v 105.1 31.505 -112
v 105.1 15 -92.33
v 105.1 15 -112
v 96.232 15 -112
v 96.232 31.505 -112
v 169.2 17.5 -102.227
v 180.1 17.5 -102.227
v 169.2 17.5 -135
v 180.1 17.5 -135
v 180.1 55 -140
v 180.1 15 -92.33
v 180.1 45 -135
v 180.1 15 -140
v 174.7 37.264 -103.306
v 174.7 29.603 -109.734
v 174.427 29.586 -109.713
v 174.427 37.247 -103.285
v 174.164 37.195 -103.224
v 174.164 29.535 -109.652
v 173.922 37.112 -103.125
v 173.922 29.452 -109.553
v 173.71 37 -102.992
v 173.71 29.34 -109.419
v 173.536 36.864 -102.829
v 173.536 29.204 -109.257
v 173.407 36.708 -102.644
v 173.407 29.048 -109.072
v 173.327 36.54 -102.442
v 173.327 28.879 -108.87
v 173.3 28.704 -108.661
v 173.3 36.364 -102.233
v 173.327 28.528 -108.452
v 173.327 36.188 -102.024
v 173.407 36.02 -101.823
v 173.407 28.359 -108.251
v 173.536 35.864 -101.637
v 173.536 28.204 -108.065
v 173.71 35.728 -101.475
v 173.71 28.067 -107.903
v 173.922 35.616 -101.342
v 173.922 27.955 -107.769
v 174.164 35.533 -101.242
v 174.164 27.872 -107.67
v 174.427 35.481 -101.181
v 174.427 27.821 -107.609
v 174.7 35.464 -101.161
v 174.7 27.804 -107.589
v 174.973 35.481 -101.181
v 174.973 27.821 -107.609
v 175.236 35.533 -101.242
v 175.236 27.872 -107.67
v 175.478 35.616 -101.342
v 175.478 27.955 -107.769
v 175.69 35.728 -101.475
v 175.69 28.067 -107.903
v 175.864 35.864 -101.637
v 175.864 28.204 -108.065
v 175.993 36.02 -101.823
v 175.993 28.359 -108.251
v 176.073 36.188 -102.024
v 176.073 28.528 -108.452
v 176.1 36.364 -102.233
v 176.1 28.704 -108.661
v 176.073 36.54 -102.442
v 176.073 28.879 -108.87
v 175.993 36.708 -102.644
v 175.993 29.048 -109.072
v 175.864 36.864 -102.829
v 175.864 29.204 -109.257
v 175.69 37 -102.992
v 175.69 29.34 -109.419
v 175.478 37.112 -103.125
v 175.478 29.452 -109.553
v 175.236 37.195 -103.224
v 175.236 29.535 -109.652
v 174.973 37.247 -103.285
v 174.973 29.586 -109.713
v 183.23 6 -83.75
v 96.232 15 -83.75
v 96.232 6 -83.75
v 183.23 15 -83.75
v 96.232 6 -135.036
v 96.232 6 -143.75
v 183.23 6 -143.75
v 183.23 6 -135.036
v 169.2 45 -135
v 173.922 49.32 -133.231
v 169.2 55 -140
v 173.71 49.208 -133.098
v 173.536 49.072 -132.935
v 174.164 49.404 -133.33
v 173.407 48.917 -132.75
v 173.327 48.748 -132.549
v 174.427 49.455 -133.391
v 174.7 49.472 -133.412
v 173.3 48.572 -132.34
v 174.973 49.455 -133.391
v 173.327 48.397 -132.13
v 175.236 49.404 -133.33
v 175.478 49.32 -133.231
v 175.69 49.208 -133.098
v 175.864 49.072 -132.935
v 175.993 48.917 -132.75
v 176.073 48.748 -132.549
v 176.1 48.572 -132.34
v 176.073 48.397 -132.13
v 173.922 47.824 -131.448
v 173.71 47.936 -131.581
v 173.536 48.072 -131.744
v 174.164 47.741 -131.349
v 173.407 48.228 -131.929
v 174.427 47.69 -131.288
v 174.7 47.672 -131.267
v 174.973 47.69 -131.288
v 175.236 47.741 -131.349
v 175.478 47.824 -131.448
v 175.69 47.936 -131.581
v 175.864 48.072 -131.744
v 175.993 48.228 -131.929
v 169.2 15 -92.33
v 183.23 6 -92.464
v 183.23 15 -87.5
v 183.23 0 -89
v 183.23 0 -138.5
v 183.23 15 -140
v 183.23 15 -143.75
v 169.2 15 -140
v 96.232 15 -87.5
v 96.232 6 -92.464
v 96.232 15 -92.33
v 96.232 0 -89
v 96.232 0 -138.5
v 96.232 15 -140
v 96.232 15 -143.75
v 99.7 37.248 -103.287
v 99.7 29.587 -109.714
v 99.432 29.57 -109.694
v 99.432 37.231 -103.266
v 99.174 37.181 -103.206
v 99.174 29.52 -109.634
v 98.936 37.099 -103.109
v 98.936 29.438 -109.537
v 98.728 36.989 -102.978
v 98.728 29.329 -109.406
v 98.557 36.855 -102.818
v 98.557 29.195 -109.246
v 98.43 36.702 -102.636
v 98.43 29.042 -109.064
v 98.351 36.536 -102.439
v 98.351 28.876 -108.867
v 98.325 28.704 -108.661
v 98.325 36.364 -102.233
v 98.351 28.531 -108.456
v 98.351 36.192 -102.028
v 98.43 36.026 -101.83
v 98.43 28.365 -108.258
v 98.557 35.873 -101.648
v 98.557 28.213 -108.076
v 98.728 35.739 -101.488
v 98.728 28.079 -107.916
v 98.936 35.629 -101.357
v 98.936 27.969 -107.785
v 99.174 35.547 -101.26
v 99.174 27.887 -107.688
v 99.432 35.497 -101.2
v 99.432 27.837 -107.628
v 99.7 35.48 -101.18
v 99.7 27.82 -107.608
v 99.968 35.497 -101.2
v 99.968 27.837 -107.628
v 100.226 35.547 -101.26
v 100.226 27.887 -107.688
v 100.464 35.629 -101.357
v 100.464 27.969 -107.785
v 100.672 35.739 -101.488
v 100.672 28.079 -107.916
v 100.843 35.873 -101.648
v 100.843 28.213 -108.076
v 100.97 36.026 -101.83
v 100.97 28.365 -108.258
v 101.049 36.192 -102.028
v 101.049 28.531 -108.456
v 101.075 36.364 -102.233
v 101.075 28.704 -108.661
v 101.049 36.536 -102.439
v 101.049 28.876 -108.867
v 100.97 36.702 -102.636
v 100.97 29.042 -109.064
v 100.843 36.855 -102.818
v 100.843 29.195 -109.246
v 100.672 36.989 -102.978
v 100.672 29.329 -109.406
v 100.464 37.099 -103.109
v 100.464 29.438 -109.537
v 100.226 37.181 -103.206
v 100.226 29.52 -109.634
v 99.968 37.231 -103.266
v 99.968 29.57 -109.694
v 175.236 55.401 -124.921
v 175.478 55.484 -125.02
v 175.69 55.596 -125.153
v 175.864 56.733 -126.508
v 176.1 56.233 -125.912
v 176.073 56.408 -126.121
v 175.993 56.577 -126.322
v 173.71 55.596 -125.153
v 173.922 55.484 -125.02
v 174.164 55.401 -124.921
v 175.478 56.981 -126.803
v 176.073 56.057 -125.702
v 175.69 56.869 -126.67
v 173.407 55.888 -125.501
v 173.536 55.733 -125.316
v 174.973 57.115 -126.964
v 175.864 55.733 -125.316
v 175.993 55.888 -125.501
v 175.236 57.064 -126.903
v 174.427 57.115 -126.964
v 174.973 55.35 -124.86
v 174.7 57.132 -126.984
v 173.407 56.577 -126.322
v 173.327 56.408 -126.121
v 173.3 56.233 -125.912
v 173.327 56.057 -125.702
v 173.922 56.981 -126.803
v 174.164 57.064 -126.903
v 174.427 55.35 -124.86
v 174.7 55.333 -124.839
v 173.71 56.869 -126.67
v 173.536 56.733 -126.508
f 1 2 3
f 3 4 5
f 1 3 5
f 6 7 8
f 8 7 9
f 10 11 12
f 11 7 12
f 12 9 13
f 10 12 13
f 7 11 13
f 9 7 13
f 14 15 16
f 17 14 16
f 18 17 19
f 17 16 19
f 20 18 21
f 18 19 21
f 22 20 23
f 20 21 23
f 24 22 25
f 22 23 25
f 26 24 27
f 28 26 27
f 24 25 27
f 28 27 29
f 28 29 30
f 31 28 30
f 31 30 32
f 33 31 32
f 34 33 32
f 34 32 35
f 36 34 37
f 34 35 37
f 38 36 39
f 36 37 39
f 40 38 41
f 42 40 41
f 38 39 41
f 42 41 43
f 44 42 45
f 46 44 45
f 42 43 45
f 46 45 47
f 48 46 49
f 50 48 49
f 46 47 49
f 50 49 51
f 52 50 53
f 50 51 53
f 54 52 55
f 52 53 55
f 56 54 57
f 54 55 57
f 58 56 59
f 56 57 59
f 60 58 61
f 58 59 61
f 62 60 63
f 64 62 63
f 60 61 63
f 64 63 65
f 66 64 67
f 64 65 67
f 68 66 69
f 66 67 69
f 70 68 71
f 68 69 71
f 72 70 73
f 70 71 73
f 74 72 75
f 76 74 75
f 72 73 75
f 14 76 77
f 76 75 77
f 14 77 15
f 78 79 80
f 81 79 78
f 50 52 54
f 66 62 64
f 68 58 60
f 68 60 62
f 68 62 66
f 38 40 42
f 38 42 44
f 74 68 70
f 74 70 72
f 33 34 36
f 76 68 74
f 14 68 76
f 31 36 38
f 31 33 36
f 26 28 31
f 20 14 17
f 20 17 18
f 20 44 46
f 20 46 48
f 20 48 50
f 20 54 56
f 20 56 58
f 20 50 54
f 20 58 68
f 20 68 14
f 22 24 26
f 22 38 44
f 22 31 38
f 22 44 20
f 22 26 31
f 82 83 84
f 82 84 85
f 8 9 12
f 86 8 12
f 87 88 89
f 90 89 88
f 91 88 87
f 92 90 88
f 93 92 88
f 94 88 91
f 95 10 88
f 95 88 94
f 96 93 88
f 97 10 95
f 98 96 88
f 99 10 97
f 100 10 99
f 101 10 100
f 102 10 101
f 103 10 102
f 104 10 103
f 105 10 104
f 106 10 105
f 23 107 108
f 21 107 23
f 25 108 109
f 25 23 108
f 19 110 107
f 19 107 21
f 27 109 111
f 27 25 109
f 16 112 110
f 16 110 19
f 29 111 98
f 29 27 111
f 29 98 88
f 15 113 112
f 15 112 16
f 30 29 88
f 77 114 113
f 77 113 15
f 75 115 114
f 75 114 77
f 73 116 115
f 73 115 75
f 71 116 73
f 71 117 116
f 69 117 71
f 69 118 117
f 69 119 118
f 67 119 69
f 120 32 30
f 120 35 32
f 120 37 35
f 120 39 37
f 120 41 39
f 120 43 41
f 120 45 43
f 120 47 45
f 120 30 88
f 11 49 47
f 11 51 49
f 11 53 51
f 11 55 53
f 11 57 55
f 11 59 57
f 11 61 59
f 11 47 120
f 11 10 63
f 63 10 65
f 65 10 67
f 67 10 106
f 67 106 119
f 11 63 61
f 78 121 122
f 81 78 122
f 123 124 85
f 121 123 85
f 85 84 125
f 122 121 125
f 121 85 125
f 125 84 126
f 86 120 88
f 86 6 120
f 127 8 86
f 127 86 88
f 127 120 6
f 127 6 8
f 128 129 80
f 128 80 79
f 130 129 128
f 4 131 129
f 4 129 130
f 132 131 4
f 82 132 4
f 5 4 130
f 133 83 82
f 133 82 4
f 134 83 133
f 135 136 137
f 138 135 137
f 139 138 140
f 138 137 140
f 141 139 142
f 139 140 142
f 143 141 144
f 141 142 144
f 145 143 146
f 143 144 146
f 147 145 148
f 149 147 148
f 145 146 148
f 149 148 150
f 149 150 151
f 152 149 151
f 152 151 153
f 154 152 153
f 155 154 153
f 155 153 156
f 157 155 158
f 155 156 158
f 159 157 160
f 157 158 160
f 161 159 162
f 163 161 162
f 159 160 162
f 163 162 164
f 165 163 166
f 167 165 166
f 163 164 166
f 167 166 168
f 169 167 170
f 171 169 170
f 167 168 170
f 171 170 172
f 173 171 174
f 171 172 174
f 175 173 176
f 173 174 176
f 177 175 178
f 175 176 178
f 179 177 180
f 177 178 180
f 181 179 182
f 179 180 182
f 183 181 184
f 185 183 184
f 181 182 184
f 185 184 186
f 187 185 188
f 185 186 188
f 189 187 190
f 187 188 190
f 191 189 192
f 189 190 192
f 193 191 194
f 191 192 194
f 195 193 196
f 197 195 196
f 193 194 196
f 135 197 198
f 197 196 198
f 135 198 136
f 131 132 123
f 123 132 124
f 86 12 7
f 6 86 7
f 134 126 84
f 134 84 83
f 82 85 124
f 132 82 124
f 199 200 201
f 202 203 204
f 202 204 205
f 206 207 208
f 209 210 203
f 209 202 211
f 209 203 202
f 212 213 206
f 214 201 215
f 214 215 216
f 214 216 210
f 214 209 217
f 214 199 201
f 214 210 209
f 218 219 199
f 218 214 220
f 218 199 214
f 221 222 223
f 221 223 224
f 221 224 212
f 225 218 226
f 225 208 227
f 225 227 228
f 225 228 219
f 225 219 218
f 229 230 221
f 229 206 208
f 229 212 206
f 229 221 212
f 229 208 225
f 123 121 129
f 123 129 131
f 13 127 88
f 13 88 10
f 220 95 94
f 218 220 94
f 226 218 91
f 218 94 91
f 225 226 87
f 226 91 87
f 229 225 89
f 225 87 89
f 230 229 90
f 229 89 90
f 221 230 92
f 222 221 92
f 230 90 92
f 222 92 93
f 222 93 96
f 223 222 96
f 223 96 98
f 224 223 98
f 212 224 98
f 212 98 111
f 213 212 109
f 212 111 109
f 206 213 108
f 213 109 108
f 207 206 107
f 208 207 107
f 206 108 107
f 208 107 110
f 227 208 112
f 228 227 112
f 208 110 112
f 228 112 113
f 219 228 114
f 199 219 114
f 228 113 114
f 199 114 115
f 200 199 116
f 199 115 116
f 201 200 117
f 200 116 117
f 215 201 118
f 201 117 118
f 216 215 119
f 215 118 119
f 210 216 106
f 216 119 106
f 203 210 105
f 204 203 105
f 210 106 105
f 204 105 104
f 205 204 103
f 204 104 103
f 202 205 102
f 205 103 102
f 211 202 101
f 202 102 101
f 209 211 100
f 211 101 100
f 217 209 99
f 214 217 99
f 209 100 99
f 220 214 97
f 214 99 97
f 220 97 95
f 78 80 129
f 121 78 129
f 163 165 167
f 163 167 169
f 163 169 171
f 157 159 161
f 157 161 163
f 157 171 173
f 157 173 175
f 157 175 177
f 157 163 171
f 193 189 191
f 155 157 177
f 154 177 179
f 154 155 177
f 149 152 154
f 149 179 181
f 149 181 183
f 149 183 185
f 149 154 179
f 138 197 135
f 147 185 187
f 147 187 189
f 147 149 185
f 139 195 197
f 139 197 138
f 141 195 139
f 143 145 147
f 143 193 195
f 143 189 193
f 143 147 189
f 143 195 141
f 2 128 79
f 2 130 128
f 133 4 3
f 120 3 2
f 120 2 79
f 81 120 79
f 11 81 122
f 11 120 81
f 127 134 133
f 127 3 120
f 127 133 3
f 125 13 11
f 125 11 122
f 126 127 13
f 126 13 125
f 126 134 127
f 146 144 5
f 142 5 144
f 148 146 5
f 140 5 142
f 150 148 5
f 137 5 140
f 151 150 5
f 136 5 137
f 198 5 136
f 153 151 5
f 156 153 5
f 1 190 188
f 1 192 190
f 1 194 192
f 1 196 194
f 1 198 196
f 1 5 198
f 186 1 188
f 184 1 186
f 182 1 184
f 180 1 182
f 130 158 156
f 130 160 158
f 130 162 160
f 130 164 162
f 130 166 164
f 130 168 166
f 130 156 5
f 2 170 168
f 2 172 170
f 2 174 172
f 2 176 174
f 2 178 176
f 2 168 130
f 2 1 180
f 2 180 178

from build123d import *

# Parameters (mm, degrees)
SKETCH1_W              = 196
SKETCH1_H              = 150
BOSS_EXTRUDE1_DEPTH    = 15
SKETCH2_W              = 166
SKETCH2_H              = 55
CUT_EXTRUDE1_DEPTH     = 9.68
SKETCH3_R              = 1.5
BOSS_EXTRUDE2_DEPTH    = 10
SKETCH4_W              = 10.9
SKETCH4_H              = 64
BOSS_EXTRUDE3_DEPTH    = 40
CUT_EXTRUDE2_DEPTH     = 109
SKETCH6_R              = 1.4
SKETCH6_R_2            = 1.375
BOSS_EXTRUDE4_DEPTH    = 10
FILLET1_R              = 10
CUT_EXTRUDE4_START     = -15
CUT_EXTRUDE4_OUTLINE_R = 1.5
CUT_EXTRUDE4_DEPTH     = 15
SKETCH10_W             = 60
SKETCH10_H             = 37
CUT_EXTRUDE5_DEPTH     = 83
SKETCH11_W             = 10
SKETCH11_H             = 52.5
CUT_EXTRUDE6_DEPTH     = 36
SKETCH13_W             = 28
SKETCH13_H             = 42.5
CUT_EXTRUDE7_DEPTH     = 19
SKETCH19_W             = 4
SKETCH19_H             = 55
SKETCH19_W_2           = 2.77
SKETCH19_H_2           = 50
CUT_EXTRUDE9_DEPTH     = 76
SKETCH21_W             = 86.997648927
SKETCH21_H             = 15
BOSS_EXTRUDE6_DEPTH    = 3.75
SKETCH22_W             = 86.997648927
SKETCH22_H             = 15
BOSS_EXTRUDE7_DEPTH    = 3.75
CUT_EXTRUDE11_DEPTH    = 94.75
CUT_EXTRUDE12_DEPTH    = 16


# Read off the part's stored shape, not the designer's step: Cut-Extrude4
with BuildPart() as part:
    # Sketch1 → Boss-Extrude1 (new body)
    with BuildSketch(Plane(origin=(0, 0, 0), x_dir=(1, 0, 0), z_dir=(0, 1, 0))):
        with Locations((98, 75)):
            Rectangle(SKETCH1_W, SKETCH1_H)
    extrude(amount=BOSS_EXTRUDE1_DEPTH)

    # Sketch2 → Cut-Extrude1 (cut)
    with BuildSketch(Plane(origin=(0, 15, 0), x_dir=(1, 0, 0), z_dir=(0, 1, 0))):
        with Locations((98, 42.5)):
            Rectangle(SKETCH2_W, SKETCH2_H)
    extrude(amount=-CUT_EXTRUDE1_DEPTH, mode=Mode.SUBTRACT)

    # Sketch3 → Boss-Extrude2 (add)
    with BuildSketch(Plane(origin=(0, 15, 0), x_dir=(1, 0, 0), z_dir=(0, 1, 0))):
        with Locations(Location((25, 133.2, 0), (0, 0, 90))):
            Circle(SKETCH3_R)
        with Locations(Location((23.7, 85, 0), (0, 0, 90))):
            Circle(SKETCH3_R)
        with Locations(Location((75.8, 118, 0), (0, 0, 90))):
            Circle(SKETCH3_R)
        with Locations(Location((75.8, 90.1, 0), (0, 0, 90))):
            Circle(SKETCH3_R)
    extrude(amount=BOSS_EXTRUDE2_DEPTH)

    # Sketch4 → Boss-Extrude3 (add)
    with BuildSketch(Plane(origin=(0, 15, 0), x_dir=(1, 0, 0), z_dir=(0, 1, 0))):
        with Locations((99.65, 108)):
            Rectangle(SKETCH4_W, SKETCH4_H)
        with Locations((174.65, 108)):
            Rectangle(SKETCH4_W, SKETCH4_H)
    extrude(amount=BOSS_EXTRUDE3_DEPTH)

    # Sketch5 → Cut-Extrude2 (cut)
    with BuildSketch(Plane(origin=(196, 0, 0), x_dir=(0, 0, -1), z_dir=(1, 0, 0))):
        Polygon((140, 55), (92.329856296, 15), (75, 15), (75, 55), align=None)
    extrude(amount=-CUT_EXTRUDE2_DEPTH, mode=Mode.SUBTRACT)

    # Sketch6 → Boss-Extrude4 (add)
    with BuildSketch(Plane(origin=(0, -36.661217825, -30.762414355), x_dir=(1, 0, 0), z_dir=(0, 0.7660444431189771, 0.6427876096865404))):
        with Locations(Location((174.7, 132.599540569, 0), (0, 0, 90))):
            Circle(SKETCH6_R)
        with Locations(Location((174.7, 101.689540569, 0), (0, 0, 90))):
            Circle(SKETCH6_R)
        with Locations(Location((99.7, 132.599540569, 0), (0, 0, 90))):
            Circle(SKETCH6_R_2)
        with Locations(Location((99.7, 101.689540569, 0), (0, 0, 90))):
            Circle(SKETCH6_R_2)
    extrude(amount=BOSS_EXTRUDE4_DEPTH)

    # Fillet1
    fillet1_edges = [part.edges().sort_by_distance(p)[0] for p in [
        (196, 15, -75),
        (98, 15, -150),
        (0, 15, -75),
        (98, 15, 0),
    ]]
    fillet(fillet1_edges, radius=FILLET1_R - 0.0001)  # a hair under: the kernel refuses the full size

    # Cut-Extrude4 outline → Cut-Extrude4 (cut)
    with BuildSketch(Plane(origin=(0, 15, 0), x_dir=(1, 0, 0), z_dir=(0, 1, 0)).offset(CUT_EXTRUDE4_START)):
        Polygon((92.232351073, 87.5), (92.232351073, 140), (196, 140), (196, 150), (0, 150), (0, 0), (196, 0), (196, 87.5), align=None)
        with Locations((23.7, 85)):
            Circle(CUT_EXTRUDE4_OUTLINE_R, mode=Mode.SUBTRACT)
        with Locations((75.8, 90.1)):
            Circle(CUT_EXTRUDE4_OUTLINE_R, mode=Mode.SUBTRACT)
        with Locations((25, 133.2)):
            Circle(CUT_EXTRUDE4_OUTLINE_R, mode=Mode.SUBTRACT)
        with Locations((75.8, 118)):
            Circle(CUT_EXTRUDE4_OUTLINE_R, mode=Mode.SUBTRACT)
    extrude(amount=CUT_EXTRUDE4_DEPTH, mode=Mode.SUBTRACT)

    # Sketch10 → Cut-Extrude5 (cut)
    with BuildSketch(Plane.ZY.offset(-92.232351073)):
        with Locations((-110, 18.5)):
            Rectangle(SKETCH10_W, SKETCH10_H)
    extrude(amount=CUT_EXTRUDE5_DEPTH, mode=Mode.SUBTRACT)

    # Sketch11 → Cut-Extrude6 (cut)
    with BuildSketch(Plane(origin=(0, 15, 0), x_dir=(1, 0, 0), z_dir=(0, 1, 0))):
        with Locations((191, 113.75)):
            Rectangle(SKETCH11_W, SKETCH11_H)
    extrude(amount=-CUT_EXTRUDE6_DEPTH, mode=Mode.SUBTRACT)

    # Sketch13 → Cut-Extrude7 (cut)
    with BuildSketch(Plane.ZY.offset(-92.232351073)):
        with Locations((-126, 36.25)):
            Rectangle(SKETCH13_W, SKETCH13_H)
    extrude(amount=-CUT_EXTRUDE7_DEPTH, mode=Mode.SUBTRACT)

    # Sketch19 → Cut-Extrude9 (cut)
    with BuildSketch(Plane.XY.offset(-87.5)):
        with Locations((94.232351073, 27.5)):
            Rectangle(SKETCH19_W, SKETCH19_H)
        with Locations((184.615, 25)):
            Rectangle(SKETCH19_W_2, SKETCH19_H_2)
    extrude(amount=-CUT_EXTRUDE9_DEPTH, mode=Mode.SUBTRACT)

    # Sketch21 → Boss-Extrude6 (add)
    with BuildSketch(Plane(origin=(0, 0, -140), x_dir=(-1, 0, 0), z_dir=(0, 0, -1))):
        with Locations((-139.731175537, 7.5)):
            Rectangle(SKETCH21_W, SKETCH21_H)
    extrude(amount=BOSS_EXTRUDE6_DEPTH)

    # Sketch22 → Boss-Extrude7 (add)
    with BuildSketch(Plane.XY.offset(-87.5)):
        with Locations((139.731175537, 7.5)):
            Rectangle(SKETCH22_W, SKETCH22_H)
    extrude(amount=BOSS_EXTRUDE7_DEPTH)

    # Sketch23 → Cut-Extrude11 (cut)
    with BuildSketch(Plane.ZY.offset(-96.232351073)):
        Polygon((-143.75, 6), (-135.035898385, 6), (-138.5, 0), (-143.75, 0), align=None)
        Polygon((-83.75, 0), (-83.75, 6), (-92.464101615, 6), (-89, 0), align=None)
    extrude(amount=-CUT_EXTRUDE11_DEPTH, mode=Mode.SUBTRACT)

    # Sketch24 → Cut-Extrude12 (cut)
    with BuildSketch(Plane(origin=(180.1, 0, 0), x_dir=(0, 0, -1), z_dir=(1, 0, 0))):
        Polygon((135, 45), (102.226776204, 17.5), (135, 17.5), align=None)
    extrude(amount=-CUT_EXTRUDE12_DEPTH, mode=Mode.SUBTRACT)


solid = part.part
